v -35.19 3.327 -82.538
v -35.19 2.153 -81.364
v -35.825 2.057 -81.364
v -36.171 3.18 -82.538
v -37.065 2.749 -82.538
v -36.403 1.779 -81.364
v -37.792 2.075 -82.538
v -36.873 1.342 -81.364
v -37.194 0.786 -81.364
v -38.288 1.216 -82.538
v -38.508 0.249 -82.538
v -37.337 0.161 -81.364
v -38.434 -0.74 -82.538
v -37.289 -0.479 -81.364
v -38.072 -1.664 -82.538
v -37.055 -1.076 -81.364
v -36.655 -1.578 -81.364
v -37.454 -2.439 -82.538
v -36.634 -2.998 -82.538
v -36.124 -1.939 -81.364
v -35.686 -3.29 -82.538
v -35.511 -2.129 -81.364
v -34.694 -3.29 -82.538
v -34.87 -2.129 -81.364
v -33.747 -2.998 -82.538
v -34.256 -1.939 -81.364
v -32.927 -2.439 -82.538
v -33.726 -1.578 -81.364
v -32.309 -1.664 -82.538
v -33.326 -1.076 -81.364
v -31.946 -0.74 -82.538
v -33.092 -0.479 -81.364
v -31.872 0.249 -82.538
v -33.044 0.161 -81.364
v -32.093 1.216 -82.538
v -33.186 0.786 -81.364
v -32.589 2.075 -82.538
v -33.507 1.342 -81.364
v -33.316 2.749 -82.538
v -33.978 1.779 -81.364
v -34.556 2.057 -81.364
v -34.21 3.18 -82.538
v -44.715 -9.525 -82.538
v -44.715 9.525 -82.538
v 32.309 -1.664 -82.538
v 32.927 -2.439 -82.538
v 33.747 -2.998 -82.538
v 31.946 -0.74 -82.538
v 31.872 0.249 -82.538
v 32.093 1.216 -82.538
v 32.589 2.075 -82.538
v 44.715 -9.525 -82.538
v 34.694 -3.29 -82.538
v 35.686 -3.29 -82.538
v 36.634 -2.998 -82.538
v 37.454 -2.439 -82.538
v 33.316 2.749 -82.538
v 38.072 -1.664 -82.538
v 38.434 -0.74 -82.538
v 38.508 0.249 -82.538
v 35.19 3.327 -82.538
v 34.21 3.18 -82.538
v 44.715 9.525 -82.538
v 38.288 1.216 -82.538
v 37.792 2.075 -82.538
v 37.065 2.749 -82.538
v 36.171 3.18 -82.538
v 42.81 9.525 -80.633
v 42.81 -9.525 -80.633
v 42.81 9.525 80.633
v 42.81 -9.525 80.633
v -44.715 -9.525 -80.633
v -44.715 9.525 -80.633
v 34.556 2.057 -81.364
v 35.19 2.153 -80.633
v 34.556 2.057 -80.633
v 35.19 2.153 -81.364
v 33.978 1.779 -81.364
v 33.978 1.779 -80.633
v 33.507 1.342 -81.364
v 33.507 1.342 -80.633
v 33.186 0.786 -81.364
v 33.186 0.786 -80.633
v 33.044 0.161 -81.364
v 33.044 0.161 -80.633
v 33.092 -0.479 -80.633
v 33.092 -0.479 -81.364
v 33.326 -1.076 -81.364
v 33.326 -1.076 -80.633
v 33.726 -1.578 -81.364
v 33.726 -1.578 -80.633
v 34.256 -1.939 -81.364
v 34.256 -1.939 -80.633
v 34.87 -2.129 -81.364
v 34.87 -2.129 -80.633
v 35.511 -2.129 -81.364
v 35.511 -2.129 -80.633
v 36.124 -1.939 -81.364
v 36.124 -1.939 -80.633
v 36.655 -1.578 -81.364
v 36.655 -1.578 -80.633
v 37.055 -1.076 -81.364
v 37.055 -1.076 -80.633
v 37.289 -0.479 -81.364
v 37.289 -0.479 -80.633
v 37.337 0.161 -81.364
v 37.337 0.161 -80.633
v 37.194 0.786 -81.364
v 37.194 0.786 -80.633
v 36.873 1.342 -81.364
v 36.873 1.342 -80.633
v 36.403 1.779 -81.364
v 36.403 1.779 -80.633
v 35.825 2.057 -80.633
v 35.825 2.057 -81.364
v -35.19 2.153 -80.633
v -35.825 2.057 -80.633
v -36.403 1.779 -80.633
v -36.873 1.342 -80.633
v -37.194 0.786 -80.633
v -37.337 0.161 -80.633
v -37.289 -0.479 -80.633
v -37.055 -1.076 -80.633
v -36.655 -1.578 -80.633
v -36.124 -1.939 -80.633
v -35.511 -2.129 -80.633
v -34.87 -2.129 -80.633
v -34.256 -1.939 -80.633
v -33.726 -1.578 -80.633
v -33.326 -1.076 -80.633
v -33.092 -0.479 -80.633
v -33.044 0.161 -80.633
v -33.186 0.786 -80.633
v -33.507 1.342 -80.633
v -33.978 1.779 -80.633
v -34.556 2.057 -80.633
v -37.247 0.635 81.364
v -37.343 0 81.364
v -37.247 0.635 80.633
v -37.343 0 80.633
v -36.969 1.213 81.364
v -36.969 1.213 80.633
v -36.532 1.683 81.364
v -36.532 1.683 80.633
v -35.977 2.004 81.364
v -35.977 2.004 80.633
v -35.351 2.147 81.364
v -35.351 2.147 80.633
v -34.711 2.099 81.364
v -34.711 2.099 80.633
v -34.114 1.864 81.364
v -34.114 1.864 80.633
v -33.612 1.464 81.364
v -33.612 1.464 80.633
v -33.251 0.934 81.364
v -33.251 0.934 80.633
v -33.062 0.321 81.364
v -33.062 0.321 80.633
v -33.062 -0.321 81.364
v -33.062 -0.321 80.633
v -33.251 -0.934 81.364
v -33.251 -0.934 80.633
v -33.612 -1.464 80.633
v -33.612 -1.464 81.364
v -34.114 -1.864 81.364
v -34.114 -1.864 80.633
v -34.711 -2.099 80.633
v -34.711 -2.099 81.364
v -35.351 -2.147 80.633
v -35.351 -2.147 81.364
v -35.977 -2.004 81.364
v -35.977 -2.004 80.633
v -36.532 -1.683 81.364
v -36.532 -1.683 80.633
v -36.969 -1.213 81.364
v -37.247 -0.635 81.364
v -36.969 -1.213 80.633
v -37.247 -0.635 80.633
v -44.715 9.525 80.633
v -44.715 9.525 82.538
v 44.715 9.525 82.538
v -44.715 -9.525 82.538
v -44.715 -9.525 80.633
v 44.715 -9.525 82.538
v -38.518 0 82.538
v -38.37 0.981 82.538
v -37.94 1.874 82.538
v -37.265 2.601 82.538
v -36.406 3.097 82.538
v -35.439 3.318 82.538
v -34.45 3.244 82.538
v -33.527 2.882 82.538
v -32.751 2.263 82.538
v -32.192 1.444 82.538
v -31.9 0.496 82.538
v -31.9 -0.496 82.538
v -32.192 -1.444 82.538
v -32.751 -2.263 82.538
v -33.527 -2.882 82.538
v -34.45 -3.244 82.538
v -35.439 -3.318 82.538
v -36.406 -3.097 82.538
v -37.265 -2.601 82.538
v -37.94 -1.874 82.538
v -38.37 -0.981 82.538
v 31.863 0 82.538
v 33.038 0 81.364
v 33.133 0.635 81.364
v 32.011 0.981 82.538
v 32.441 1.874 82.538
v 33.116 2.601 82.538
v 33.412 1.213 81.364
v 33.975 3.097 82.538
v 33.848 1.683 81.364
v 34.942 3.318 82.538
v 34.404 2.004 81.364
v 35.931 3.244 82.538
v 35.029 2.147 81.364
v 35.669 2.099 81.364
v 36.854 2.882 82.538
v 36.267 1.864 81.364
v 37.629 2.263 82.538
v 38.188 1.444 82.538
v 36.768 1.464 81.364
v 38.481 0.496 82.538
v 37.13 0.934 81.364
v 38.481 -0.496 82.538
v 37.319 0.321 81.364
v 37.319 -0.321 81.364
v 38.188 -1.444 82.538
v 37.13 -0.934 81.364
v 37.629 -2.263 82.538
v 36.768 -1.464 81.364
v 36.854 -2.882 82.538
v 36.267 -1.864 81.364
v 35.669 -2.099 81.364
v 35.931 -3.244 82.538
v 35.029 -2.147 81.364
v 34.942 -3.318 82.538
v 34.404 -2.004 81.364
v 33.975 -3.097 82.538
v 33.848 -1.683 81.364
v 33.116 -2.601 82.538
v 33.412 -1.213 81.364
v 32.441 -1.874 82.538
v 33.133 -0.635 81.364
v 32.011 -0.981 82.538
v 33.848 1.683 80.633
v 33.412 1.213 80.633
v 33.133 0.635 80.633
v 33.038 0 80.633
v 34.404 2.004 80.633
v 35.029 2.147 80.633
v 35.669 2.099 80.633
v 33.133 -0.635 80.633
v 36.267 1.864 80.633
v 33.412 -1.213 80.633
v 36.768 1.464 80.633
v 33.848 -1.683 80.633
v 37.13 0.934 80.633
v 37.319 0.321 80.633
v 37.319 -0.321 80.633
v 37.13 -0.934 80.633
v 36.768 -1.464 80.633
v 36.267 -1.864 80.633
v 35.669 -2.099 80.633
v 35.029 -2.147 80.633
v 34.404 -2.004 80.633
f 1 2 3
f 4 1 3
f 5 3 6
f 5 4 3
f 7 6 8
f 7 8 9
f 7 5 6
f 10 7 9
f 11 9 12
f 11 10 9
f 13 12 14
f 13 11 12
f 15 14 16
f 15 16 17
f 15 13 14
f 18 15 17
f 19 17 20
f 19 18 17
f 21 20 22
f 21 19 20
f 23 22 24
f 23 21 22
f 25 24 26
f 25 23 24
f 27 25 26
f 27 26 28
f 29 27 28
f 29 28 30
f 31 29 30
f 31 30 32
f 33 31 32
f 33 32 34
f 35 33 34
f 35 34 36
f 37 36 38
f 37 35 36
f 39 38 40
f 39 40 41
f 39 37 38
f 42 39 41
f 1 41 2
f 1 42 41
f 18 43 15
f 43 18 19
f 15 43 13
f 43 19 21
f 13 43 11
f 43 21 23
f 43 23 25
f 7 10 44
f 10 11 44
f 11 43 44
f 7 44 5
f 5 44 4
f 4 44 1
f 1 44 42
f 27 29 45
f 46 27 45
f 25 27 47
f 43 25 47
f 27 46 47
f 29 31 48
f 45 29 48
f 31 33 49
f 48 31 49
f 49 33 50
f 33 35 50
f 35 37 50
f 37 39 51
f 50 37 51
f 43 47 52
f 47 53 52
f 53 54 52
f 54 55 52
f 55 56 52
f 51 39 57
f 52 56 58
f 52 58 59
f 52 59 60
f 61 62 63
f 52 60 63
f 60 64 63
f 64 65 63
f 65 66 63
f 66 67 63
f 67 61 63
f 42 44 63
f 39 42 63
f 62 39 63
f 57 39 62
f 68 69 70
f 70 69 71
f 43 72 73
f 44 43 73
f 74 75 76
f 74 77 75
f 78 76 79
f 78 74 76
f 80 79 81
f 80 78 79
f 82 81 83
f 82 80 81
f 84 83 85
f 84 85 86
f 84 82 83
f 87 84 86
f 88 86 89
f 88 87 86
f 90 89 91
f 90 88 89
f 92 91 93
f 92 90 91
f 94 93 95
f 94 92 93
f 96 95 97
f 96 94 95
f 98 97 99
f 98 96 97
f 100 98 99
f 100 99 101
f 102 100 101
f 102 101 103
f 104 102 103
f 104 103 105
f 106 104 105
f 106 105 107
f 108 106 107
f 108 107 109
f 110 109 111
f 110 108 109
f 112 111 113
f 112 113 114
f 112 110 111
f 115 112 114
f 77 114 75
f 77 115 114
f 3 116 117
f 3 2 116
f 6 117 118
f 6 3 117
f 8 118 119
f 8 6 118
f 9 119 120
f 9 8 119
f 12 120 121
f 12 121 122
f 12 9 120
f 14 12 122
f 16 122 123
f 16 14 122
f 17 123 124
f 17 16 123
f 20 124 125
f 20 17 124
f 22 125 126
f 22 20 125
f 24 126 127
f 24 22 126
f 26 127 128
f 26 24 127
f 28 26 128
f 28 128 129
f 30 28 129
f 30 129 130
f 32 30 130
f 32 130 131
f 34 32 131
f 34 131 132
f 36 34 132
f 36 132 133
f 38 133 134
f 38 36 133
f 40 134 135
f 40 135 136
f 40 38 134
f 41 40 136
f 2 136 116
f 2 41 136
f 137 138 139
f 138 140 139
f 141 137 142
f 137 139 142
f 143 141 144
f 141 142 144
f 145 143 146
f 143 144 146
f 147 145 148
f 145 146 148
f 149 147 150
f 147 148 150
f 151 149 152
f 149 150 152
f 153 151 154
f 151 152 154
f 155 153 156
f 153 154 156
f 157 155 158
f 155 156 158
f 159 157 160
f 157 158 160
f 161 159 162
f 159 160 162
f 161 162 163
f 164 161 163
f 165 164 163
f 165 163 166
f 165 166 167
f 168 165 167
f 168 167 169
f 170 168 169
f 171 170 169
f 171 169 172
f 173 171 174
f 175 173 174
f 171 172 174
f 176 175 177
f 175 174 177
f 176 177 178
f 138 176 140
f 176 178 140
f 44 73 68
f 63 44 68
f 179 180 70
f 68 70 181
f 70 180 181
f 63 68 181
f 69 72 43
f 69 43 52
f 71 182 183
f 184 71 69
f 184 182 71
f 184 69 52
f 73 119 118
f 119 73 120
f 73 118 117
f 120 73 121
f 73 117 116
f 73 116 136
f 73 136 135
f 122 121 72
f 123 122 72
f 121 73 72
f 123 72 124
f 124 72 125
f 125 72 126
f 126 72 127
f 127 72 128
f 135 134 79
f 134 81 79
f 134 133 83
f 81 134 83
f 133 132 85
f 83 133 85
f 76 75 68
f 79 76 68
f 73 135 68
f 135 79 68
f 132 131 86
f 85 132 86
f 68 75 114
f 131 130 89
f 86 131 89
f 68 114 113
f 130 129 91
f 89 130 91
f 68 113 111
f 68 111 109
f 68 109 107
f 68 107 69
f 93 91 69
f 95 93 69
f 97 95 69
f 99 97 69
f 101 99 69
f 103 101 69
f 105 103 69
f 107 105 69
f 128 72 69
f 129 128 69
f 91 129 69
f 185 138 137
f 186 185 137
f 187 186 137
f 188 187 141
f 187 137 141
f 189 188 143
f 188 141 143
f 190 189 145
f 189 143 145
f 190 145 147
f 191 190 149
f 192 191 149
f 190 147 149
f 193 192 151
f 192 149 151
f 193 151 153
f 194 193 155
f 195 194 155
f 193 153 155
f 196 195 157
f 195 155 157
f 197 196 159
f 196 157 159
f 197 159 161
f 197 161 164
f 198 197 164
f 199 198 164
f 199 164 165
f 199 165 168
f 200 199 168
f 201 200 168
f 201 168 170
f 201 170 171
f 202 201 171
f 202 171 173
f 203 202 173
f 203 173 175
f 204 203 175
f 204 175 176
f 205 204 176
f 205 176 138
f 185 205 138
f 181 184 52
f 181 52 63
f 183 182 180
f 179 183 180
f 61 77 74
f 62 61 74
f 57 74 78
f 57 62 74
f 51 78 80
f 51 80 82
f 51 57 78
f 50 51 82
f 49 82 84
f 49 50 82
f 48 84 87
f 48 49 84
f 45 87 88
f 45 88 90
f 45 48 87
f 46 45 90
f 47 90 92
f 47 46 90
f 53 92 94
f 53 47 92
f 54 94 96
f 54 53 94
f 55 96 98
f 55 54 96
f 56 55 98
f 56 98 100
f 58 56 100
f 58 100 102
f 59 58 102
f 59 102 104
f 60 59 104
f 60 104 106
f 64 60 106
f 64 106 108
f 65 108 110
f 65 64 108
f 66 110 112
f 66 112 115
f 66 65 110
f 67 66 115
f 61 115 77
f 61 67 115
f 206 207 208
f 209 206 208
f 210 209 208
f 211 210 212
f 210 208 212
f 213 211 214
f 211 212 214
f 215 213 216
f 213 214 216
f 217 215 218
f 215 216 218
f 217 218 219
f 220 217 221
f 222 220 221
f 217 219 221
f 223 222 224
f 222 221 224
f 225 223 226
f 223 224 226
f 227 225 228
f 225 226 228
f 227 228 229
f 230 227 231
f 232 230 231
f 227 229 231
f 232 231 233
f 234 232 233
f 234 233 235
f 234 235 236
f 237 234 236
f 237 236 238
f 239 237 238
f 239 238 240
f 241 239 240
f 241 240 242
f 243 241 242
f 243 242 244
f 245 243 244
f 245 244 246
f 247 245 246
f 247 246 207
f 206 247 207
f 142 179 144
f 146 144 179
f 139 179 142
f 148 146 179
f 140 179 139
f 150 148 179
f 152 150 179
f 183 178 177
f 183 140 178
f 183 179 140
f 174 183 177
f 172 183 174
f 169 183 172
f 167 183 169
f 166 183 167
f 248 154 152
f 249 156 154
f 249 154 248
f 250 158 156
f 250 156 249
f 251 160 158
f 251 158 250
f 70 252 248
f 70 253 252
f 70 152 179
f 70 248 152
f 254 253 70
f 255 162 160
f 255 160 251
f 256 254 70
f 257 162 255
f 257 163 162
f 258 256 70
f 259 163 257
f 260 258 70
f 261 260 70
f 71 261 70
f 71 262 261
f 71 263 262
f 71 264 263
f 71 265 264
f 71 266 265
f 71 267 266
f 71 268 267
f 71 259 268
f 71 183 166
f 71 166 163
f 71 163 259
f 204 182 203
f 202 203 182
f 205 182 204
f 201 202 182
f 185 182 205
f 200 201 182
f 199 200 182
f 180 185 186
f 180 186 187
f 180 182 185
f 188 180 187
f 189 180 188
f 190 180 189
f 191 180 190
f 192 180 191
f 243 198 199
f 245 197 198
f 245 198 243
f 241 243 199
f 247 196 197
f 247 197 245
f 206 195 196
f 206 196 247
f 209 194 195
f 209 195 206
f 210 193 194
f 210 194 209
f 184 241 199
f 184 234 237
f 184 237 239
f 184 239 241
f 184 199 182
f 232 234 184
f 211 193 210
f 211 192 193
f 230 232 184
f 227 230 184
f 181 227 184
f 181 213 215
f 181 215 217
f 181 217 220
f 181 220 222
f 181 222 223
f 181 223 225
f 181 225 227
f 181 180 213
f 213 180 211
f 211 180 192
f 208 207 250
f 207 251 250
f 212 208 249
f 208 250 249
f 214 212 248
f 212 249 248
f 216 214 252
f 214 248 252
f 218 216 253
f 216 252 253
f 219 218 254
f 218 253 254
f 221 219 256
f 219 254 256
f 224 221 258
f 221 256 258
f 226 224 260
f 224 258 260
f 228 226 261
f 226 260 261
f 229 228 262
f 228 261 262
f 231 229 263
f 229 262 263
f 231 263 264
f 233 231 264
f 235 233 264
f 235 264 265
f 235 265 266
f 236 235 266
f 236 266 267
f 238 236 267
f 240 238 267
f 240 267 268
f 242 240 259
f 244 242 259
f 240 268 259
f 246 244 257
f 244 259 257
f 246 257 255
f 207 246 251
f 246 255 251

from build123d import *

# Parameters (mm, degrees)
SKETCH3_W                       = 89.4306822
SKETCH3_H                       = 19.05
BOSS_EXTRUDE1_DEPTH             = 82.538333314
SKETCH4_W                       = 87.5256822
SKETCH4_H                       = 161.266666628
CUT_EXTRUDE1_DEPTH              = 96.785910738
F_6_CLEARANCE_HOLE1_AT_2_COUNT  = 2
F_6_CLEARANCE_HOLE1_AT_2_PITCH  = 70.3806822
F_6_CLEARANCE_HOLE2_D           = 4.3053
F_6_CLEARANCE_HOLE2_DEPTH       = 6.858
F_6_CLEARANCE_HOLE2_CSINK_D     = 6.6548
F_6_CLEARANCE_HOLE2_CSINK_ANGLE = 90
F_6_CLEARANCE_HOLE2_TIP         = 1.293442612


with BuildPart() as part:
    # Sketch3 → Boss-Extrude1 (new, symmetric)
    with BuildSketch(Plane.XY):
        Rectangle(SKETCH3_W, SKETCH3_H)
    extrude(amount=BOSS_EXTRUDE1_DEPTH, both=True)

    # Sketch4 → Cut-Extrude1 (cut, through all)
    with BuildSketch(Plane.XZ.offset(9.525)):
        with Locations((-0.9525, 0)):
            Rectangle(SKETCH4_W, SKETCH4_H)
    extrude(amount=-CUT_EXTRUDE1_DEPTH, mode=Mode.SUBTRACT)

    # Sketch6 → #6 Clearance Hole1 (revolve, cut)
    with BuildSketch(Plane(origin=(35.1903411, 0, -82.538333314), x_dir=(0, 1, 0), z_dir=(1, 0, 0))):
        Polygon((0, 0), (0, 1.905), (2.15265, 1.905), (2.15265, 1.17475), (3.3274, 0), align=None)
    f_6_clearance_hole1 = revolve(axis=Axis((35.1903411, 0, -88.888333314), (0, 0, 1)), mode=Mode.SUBTRACT)

    # #6 Clearance Hole1 at 2: #6 Clearance Hole1 ×2
    with Locations(*[(-i * F_6_CLEARANCE_HOLE1_AT_2_PITCH, 0, 0) for i in range(1, F_6_CLEARANCE_HOLE1_AT_2_COUNT)]):
        add(f_6_clearance_hole1, mode=Mode.SUBTRACT)

    # #6 Clearance Hole2
    with Locations(Plane.XY.offset(82.538333314)):
        with Locations((-35.1903411, 0), (35.1903411, 0)):
            CounterSinkHole(F_6_CLEARANCE_HOLE2_D / 2, F_6_CLEARANCE_HOLE2_CSINK_D / 2, depth=F_6_CLEARANCE_HOLE2_DEPTH, counter_sink_angle=F_6_CLEARANCE_HOLE2_CSINK_ANGLE)
            with Locations((0, 0, -(F_6_CLEARANCE_HOLE2_DEPTH + F_6_CLEARANCE_HOLE2_TIP / 2))):  # 118° drill point
                Cone(0, F_6_CLEARANCE_HOLE2_D / 2, F_6_CLEARANCE_HOLE2_TIP, mode=Mode.SUBTRACT)


solid = part.part
